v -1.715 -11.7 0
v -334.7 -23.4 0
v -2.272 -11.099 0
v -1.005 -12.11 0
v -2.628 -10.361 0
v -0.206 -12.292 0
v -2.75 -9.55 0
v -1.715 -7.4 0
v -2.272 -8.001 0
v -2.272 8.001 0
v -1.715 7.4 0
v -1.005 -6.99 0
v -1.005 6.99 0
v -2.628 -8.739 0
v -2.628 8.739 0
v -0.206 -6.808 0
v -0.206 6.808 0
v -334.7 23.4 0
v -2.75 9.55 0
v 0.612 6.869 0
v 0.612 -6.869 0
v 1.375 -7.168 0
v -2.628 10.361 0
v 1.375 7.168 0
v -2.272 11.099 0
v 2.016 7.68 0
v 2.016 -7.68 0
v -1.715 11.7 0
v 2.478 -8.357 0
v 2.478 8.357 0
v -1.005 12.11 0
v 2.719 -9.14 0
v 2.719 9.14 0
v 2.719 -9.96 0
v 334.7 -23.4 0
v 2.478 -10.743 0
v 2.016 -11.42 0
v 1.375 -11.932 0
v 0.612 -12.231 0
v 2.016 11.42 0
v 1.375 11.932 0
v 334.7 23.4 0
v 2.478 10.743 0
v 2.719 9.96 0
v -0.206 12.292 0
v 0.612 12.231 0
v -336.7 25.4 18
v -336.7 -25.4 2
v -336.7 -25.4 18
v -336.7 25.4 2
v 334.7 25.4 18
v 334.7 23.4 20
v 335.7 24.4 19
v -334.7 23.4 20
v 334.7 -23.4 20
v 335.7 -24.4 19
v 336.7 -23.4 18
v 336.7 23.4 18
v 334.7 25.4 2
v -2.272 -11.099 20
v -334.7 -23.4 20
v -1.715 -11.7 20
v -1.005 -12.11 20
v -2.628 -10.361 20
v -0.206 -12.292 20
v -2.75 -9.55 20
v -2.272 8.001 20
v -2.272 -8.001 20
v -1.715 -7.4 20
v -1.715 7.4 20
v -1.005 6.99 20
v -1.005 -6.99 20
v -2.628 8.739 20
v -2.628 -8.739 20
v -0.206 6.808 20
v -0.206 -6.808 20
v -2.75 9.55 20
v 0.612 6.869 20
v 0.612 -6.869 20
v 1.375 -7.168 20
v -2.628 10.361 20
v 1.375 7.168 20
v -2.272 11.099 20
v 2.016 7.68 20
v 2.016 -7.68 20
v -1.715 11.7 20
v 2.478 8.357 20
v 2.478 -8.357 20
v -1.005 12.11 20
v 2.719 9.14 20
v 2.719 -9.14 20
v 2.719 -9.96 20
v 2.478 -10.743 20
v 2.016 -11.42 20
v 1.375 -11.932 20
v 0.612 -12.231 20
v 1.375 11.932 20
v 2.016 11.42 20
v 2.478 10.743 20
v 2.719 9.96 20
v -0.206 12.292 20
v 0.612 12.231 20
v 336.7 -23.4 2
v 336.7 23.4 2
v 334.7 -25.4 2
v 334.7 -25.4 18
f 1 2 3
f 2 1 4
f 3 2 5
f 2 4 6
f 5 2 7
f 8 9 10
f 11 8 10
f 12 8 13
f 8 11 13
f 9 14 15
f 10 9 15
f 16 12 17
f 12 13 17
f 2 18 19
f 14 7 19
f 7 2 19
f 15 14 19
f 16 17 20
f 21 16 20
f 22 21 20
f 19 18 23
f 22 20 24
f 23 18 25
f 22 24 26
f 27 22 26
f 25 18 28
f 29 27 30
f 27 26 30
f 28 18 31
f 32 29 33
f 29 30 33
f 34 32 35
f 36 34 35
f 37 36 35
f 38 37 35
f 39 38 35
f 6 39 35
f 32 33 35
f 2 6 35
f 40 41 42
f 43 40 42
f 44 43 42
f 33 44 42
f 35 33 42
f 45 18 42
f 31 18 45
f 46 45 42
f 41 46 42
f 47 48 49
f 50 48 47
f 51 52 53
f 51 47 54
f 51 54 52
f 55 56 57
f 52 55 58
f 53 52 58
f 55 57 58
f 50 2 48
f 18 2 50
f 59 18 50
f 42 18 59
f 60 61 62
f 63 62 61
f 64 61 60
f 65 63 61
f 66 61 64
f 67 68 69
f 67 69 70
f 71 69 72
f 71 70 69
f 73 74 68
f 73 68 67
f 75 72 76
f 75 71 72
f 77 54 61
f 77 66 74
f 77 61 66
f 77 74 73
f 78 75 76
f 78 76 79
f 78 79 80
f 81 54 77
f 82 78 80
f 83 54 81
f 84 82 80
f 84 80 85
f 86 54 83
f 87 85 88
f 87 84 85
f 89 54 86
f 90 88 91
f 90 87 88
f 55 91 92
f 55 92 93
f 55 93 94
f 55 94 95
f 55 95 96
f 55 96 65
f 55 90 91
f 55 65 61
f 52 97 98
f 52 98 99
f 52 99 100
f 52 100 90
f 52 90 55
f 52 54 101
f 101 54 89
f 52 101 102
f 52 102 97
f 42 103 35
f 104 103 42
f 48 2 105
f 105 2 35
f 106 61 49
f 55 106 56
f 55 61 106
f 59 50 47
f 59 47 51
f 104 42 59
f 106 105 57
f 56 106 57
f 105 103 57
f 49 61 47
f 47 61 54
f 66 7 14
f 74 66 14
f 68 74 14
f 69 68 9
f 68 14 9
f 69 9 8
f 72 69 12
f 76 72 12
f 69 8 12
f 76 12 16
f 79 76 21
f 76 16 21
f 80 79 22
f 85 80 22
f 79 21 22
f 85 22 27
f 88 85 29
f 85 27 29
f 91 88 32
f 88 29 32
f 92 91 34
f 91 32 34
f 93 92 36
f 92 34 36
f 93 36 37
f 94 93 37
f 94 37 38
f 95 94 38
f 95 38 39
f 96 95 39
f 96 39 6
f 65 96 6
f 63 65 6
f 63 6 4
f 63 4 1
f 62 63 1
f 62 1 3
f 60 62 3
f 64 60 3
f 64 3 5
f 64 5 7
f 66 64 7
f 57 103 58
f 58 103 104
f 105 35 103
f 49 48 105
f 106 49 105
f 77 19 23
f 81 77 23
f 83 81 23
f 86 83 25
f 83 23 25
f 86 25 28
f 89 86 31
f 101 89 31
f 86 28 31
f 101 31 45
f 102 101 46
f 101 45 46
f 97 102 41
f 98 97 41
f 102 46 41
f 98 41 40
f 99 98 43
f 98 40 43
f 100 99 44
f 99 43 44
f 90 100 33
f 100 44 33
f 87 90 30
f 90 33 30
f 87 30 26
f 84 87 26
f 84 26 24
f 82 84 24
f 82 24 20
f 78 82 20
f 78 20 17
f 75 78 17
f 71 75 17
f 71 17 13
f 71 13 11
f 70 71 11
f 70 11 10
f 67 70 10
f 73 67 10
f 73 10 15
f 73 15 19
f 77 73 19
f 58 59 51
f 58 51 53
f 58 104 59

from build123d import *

# Parameters (mm, degrees)
CROQUIS1_W              = 673.4
CROQUIS1_H              = 50.8
SALIENTE_EXTRUIR1_DEPTH = 20
CROQUIS2_R              = 2.75
CORTAR_EXTRUIR1_DEPTH   = 21
CHAFL_N2_SIZE           = 2
CHAFL_N5_SIZE           = 2


with BuildPart() as part:
    # Croquis1 → Saliente-Extruir1 (new body)
    with BuildSketch(Plane.XY):
        Rectangle(CROQUIS1_W, CROQUIS1_H)
    extrude(amount=SALIENTE_EXTRUIR1_DEPTH)

    # Croquis2 → Cortar-Extruir1 (cut, through all)
    with BuildSketch(Plane(origin=(0, 0, 0), x_dir=(-1, 0, 0), z_dir=(0, 0, -1))):
        with Locations((0, 9.55)):
            Circle(CROQUIS2_R)
        with Locations((0, -9.55)):
            Circle(CROQUIS2_R)
    extrude(amount=-CORTAR_EXTRUIR1_DEPTH, mode=Mode.SUBTRACT)

    # Chaflán2
    chafl_n2_edges = [part.edges().sort_by_distance(p)[0] for p in [
        (336.7, 0, 20),
        (0, -25.4, 0),
        (-336.7, 0, 0),
        (0, 25.4, 0),
        (336.7, 0, 0),
        (336.7, -25.4, 10),
        (336.7, 25.4, 10),
    ]]
    chamfer(chafl_n2_edges, length=CHAFL_N2_SIZE)

    # Chaflán5
    chafl_n5_edges = [part.edges().sort_by_distance(p)[0] for p in [
        (-336.7, 0, 20),
        (-1, -25.4, 20),
        (-1, 25.4, 20),
    ]]
    chamfer(chafl_n5_edges, length=CHAFL_N5_SIZE)


solid = part.part
